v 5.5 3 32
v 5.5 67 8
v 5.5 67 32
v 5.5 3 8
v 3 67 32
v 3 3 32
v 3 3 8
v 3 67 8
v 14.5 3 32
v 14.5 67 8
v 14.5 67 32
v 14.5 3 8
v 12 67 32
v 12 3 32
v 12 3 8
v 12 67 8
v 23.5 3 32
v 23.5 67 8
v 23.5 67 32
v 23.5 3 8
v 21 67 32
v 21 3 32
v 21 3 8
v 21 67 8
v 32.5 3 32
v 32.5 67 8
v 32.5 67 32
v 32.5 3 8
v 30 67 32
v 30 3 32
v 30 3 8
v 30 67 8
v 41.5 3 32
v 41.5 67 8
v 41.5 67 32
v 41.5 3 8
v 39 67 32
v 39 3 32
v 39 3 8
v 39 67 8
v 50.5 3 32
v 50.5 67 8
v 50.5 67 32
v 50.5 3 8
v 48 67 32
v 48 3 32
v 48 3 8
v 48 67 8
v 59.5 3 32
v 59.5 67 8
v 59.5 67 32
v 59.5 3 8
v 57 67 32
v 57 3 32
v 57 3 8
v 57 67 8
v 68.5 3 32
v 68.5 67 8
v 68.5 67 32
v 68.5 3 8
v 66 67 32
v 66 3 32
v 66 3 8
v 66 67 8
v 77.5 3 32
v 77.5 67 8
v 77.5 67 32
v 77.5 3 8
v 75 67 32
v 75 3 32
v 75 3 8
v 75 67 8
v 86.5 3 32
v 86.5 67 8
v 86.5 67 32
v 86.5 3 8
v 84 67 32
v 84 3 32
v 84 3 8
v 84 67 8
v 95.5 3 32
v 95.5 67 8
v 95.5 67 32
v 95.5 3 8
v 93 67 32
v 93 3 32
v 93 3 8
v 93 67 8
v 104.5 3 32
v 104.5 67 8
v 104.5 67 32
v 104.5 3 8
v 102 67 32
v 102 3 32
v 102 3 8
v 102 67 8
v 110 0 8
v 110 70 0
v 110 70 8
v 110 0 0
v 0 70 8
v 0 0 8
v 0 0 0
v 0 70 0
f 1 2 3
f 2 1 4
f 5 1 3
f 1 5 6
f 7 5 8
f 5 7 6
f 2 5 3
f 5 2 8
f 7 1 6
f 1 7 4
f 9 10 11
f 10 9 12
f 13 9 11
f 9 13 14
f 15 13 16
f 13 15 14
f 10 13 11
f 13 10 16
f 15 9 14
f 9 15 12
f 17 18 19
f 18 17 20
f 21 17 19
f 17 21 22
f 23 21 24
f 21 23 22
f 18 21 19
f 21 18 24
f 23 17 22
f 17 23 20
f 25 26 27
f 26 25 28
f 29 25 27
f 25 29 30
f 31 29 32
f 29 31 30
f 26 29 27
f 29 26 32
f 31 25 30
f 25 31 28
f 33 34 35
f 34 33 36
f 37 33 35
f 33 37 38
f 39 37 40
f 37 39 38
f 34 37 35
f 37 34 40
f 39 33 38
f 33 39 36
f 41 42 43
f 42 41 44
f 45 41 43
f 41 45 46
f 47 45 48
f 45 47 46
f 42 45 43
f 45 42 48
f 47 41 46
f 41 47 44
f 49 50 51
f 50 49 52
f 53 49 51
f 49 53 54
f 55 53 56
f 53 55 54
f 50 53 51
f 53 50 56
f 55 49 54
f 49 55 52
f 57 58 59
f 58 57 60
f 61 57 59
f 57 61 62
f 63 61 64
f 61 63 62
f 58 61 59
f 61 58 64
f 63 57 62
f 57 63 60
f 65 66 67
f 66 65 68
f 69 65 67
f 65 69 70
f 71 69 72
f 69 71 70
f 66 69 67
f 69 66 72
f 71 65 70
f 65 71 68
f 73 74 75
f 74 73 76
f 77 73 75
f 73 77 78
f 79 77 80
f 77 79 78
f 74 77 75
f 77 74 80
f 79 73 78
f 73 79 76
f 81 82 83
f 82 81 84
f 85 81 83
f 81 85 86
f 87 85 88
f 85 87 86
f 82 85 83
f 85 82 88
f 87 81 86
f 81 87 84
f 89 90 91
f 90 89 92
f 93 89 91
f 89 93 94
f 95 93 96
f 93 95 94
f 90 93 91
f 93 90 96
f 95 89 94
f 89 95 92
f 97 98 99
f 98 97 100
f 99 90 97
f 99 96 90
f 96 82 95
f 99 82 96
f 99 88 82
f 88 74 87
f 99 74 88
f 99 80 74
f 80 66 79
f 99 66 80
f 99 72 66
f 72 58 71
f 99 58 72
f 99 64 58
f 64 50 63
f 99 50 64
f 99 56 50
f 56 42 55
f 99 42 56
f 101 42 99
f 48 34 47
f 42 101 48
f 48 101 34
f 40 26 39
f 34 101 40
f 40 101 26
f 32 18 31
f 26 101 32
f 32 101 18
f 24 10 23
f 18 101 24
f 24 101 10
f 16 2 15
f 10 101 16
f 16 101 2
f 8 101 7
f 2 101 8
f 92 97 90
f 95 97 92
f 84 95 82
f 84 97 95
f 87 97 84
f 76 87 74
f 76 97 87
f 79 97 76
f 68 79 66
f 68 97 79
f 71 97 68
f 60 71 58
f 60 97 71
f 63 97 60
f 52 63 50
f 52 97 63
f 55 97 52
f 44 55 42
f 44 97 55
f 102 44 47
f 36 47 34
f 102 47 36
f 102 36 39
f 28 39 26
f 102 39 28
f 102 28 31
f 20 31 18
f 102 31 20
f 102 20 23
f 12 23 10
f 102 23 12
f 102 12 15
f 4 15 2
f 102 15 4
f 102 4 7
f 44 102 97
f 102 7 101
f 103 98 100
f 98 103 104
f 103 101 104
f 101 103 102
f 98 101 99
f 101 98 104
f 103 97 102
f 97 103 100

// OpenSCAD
$fn = 32;

// ----------------------------------------------------------------------
// Heatsink: uniform fin block
// ----------------------------------------------------------------------

// --- parameters (mm) ---
base_l = 110;             // base length, X
base_w = 70;              // base width, Y
base_t = 8;               // base plate thickness
fin_h = 25;               // fin height above the base
fin_t = 2.5;              // fin thickness
edge = 3;                 // margin from the base ends
pitch = 9;                // fin pitch
fit_tol = 0.1;            // tolerance for press fits, mm
free_tol = 0.5;           // tolerance for clearance fits, mm

n_fins = floor((base_l - 2 * edge - fin_t) / pitch) + 1;  // fin count
total_h = base_t + fin_h - 1;  // overall height

union() {
  cube([base_l, base_w, base_t]);
  for (i = [0 : n_fins - 1])
    translate([edge + i * pitch, edge, base_t - 1])
      cube([fin_t, base_w - 2 * edge, fin_h]);
}
